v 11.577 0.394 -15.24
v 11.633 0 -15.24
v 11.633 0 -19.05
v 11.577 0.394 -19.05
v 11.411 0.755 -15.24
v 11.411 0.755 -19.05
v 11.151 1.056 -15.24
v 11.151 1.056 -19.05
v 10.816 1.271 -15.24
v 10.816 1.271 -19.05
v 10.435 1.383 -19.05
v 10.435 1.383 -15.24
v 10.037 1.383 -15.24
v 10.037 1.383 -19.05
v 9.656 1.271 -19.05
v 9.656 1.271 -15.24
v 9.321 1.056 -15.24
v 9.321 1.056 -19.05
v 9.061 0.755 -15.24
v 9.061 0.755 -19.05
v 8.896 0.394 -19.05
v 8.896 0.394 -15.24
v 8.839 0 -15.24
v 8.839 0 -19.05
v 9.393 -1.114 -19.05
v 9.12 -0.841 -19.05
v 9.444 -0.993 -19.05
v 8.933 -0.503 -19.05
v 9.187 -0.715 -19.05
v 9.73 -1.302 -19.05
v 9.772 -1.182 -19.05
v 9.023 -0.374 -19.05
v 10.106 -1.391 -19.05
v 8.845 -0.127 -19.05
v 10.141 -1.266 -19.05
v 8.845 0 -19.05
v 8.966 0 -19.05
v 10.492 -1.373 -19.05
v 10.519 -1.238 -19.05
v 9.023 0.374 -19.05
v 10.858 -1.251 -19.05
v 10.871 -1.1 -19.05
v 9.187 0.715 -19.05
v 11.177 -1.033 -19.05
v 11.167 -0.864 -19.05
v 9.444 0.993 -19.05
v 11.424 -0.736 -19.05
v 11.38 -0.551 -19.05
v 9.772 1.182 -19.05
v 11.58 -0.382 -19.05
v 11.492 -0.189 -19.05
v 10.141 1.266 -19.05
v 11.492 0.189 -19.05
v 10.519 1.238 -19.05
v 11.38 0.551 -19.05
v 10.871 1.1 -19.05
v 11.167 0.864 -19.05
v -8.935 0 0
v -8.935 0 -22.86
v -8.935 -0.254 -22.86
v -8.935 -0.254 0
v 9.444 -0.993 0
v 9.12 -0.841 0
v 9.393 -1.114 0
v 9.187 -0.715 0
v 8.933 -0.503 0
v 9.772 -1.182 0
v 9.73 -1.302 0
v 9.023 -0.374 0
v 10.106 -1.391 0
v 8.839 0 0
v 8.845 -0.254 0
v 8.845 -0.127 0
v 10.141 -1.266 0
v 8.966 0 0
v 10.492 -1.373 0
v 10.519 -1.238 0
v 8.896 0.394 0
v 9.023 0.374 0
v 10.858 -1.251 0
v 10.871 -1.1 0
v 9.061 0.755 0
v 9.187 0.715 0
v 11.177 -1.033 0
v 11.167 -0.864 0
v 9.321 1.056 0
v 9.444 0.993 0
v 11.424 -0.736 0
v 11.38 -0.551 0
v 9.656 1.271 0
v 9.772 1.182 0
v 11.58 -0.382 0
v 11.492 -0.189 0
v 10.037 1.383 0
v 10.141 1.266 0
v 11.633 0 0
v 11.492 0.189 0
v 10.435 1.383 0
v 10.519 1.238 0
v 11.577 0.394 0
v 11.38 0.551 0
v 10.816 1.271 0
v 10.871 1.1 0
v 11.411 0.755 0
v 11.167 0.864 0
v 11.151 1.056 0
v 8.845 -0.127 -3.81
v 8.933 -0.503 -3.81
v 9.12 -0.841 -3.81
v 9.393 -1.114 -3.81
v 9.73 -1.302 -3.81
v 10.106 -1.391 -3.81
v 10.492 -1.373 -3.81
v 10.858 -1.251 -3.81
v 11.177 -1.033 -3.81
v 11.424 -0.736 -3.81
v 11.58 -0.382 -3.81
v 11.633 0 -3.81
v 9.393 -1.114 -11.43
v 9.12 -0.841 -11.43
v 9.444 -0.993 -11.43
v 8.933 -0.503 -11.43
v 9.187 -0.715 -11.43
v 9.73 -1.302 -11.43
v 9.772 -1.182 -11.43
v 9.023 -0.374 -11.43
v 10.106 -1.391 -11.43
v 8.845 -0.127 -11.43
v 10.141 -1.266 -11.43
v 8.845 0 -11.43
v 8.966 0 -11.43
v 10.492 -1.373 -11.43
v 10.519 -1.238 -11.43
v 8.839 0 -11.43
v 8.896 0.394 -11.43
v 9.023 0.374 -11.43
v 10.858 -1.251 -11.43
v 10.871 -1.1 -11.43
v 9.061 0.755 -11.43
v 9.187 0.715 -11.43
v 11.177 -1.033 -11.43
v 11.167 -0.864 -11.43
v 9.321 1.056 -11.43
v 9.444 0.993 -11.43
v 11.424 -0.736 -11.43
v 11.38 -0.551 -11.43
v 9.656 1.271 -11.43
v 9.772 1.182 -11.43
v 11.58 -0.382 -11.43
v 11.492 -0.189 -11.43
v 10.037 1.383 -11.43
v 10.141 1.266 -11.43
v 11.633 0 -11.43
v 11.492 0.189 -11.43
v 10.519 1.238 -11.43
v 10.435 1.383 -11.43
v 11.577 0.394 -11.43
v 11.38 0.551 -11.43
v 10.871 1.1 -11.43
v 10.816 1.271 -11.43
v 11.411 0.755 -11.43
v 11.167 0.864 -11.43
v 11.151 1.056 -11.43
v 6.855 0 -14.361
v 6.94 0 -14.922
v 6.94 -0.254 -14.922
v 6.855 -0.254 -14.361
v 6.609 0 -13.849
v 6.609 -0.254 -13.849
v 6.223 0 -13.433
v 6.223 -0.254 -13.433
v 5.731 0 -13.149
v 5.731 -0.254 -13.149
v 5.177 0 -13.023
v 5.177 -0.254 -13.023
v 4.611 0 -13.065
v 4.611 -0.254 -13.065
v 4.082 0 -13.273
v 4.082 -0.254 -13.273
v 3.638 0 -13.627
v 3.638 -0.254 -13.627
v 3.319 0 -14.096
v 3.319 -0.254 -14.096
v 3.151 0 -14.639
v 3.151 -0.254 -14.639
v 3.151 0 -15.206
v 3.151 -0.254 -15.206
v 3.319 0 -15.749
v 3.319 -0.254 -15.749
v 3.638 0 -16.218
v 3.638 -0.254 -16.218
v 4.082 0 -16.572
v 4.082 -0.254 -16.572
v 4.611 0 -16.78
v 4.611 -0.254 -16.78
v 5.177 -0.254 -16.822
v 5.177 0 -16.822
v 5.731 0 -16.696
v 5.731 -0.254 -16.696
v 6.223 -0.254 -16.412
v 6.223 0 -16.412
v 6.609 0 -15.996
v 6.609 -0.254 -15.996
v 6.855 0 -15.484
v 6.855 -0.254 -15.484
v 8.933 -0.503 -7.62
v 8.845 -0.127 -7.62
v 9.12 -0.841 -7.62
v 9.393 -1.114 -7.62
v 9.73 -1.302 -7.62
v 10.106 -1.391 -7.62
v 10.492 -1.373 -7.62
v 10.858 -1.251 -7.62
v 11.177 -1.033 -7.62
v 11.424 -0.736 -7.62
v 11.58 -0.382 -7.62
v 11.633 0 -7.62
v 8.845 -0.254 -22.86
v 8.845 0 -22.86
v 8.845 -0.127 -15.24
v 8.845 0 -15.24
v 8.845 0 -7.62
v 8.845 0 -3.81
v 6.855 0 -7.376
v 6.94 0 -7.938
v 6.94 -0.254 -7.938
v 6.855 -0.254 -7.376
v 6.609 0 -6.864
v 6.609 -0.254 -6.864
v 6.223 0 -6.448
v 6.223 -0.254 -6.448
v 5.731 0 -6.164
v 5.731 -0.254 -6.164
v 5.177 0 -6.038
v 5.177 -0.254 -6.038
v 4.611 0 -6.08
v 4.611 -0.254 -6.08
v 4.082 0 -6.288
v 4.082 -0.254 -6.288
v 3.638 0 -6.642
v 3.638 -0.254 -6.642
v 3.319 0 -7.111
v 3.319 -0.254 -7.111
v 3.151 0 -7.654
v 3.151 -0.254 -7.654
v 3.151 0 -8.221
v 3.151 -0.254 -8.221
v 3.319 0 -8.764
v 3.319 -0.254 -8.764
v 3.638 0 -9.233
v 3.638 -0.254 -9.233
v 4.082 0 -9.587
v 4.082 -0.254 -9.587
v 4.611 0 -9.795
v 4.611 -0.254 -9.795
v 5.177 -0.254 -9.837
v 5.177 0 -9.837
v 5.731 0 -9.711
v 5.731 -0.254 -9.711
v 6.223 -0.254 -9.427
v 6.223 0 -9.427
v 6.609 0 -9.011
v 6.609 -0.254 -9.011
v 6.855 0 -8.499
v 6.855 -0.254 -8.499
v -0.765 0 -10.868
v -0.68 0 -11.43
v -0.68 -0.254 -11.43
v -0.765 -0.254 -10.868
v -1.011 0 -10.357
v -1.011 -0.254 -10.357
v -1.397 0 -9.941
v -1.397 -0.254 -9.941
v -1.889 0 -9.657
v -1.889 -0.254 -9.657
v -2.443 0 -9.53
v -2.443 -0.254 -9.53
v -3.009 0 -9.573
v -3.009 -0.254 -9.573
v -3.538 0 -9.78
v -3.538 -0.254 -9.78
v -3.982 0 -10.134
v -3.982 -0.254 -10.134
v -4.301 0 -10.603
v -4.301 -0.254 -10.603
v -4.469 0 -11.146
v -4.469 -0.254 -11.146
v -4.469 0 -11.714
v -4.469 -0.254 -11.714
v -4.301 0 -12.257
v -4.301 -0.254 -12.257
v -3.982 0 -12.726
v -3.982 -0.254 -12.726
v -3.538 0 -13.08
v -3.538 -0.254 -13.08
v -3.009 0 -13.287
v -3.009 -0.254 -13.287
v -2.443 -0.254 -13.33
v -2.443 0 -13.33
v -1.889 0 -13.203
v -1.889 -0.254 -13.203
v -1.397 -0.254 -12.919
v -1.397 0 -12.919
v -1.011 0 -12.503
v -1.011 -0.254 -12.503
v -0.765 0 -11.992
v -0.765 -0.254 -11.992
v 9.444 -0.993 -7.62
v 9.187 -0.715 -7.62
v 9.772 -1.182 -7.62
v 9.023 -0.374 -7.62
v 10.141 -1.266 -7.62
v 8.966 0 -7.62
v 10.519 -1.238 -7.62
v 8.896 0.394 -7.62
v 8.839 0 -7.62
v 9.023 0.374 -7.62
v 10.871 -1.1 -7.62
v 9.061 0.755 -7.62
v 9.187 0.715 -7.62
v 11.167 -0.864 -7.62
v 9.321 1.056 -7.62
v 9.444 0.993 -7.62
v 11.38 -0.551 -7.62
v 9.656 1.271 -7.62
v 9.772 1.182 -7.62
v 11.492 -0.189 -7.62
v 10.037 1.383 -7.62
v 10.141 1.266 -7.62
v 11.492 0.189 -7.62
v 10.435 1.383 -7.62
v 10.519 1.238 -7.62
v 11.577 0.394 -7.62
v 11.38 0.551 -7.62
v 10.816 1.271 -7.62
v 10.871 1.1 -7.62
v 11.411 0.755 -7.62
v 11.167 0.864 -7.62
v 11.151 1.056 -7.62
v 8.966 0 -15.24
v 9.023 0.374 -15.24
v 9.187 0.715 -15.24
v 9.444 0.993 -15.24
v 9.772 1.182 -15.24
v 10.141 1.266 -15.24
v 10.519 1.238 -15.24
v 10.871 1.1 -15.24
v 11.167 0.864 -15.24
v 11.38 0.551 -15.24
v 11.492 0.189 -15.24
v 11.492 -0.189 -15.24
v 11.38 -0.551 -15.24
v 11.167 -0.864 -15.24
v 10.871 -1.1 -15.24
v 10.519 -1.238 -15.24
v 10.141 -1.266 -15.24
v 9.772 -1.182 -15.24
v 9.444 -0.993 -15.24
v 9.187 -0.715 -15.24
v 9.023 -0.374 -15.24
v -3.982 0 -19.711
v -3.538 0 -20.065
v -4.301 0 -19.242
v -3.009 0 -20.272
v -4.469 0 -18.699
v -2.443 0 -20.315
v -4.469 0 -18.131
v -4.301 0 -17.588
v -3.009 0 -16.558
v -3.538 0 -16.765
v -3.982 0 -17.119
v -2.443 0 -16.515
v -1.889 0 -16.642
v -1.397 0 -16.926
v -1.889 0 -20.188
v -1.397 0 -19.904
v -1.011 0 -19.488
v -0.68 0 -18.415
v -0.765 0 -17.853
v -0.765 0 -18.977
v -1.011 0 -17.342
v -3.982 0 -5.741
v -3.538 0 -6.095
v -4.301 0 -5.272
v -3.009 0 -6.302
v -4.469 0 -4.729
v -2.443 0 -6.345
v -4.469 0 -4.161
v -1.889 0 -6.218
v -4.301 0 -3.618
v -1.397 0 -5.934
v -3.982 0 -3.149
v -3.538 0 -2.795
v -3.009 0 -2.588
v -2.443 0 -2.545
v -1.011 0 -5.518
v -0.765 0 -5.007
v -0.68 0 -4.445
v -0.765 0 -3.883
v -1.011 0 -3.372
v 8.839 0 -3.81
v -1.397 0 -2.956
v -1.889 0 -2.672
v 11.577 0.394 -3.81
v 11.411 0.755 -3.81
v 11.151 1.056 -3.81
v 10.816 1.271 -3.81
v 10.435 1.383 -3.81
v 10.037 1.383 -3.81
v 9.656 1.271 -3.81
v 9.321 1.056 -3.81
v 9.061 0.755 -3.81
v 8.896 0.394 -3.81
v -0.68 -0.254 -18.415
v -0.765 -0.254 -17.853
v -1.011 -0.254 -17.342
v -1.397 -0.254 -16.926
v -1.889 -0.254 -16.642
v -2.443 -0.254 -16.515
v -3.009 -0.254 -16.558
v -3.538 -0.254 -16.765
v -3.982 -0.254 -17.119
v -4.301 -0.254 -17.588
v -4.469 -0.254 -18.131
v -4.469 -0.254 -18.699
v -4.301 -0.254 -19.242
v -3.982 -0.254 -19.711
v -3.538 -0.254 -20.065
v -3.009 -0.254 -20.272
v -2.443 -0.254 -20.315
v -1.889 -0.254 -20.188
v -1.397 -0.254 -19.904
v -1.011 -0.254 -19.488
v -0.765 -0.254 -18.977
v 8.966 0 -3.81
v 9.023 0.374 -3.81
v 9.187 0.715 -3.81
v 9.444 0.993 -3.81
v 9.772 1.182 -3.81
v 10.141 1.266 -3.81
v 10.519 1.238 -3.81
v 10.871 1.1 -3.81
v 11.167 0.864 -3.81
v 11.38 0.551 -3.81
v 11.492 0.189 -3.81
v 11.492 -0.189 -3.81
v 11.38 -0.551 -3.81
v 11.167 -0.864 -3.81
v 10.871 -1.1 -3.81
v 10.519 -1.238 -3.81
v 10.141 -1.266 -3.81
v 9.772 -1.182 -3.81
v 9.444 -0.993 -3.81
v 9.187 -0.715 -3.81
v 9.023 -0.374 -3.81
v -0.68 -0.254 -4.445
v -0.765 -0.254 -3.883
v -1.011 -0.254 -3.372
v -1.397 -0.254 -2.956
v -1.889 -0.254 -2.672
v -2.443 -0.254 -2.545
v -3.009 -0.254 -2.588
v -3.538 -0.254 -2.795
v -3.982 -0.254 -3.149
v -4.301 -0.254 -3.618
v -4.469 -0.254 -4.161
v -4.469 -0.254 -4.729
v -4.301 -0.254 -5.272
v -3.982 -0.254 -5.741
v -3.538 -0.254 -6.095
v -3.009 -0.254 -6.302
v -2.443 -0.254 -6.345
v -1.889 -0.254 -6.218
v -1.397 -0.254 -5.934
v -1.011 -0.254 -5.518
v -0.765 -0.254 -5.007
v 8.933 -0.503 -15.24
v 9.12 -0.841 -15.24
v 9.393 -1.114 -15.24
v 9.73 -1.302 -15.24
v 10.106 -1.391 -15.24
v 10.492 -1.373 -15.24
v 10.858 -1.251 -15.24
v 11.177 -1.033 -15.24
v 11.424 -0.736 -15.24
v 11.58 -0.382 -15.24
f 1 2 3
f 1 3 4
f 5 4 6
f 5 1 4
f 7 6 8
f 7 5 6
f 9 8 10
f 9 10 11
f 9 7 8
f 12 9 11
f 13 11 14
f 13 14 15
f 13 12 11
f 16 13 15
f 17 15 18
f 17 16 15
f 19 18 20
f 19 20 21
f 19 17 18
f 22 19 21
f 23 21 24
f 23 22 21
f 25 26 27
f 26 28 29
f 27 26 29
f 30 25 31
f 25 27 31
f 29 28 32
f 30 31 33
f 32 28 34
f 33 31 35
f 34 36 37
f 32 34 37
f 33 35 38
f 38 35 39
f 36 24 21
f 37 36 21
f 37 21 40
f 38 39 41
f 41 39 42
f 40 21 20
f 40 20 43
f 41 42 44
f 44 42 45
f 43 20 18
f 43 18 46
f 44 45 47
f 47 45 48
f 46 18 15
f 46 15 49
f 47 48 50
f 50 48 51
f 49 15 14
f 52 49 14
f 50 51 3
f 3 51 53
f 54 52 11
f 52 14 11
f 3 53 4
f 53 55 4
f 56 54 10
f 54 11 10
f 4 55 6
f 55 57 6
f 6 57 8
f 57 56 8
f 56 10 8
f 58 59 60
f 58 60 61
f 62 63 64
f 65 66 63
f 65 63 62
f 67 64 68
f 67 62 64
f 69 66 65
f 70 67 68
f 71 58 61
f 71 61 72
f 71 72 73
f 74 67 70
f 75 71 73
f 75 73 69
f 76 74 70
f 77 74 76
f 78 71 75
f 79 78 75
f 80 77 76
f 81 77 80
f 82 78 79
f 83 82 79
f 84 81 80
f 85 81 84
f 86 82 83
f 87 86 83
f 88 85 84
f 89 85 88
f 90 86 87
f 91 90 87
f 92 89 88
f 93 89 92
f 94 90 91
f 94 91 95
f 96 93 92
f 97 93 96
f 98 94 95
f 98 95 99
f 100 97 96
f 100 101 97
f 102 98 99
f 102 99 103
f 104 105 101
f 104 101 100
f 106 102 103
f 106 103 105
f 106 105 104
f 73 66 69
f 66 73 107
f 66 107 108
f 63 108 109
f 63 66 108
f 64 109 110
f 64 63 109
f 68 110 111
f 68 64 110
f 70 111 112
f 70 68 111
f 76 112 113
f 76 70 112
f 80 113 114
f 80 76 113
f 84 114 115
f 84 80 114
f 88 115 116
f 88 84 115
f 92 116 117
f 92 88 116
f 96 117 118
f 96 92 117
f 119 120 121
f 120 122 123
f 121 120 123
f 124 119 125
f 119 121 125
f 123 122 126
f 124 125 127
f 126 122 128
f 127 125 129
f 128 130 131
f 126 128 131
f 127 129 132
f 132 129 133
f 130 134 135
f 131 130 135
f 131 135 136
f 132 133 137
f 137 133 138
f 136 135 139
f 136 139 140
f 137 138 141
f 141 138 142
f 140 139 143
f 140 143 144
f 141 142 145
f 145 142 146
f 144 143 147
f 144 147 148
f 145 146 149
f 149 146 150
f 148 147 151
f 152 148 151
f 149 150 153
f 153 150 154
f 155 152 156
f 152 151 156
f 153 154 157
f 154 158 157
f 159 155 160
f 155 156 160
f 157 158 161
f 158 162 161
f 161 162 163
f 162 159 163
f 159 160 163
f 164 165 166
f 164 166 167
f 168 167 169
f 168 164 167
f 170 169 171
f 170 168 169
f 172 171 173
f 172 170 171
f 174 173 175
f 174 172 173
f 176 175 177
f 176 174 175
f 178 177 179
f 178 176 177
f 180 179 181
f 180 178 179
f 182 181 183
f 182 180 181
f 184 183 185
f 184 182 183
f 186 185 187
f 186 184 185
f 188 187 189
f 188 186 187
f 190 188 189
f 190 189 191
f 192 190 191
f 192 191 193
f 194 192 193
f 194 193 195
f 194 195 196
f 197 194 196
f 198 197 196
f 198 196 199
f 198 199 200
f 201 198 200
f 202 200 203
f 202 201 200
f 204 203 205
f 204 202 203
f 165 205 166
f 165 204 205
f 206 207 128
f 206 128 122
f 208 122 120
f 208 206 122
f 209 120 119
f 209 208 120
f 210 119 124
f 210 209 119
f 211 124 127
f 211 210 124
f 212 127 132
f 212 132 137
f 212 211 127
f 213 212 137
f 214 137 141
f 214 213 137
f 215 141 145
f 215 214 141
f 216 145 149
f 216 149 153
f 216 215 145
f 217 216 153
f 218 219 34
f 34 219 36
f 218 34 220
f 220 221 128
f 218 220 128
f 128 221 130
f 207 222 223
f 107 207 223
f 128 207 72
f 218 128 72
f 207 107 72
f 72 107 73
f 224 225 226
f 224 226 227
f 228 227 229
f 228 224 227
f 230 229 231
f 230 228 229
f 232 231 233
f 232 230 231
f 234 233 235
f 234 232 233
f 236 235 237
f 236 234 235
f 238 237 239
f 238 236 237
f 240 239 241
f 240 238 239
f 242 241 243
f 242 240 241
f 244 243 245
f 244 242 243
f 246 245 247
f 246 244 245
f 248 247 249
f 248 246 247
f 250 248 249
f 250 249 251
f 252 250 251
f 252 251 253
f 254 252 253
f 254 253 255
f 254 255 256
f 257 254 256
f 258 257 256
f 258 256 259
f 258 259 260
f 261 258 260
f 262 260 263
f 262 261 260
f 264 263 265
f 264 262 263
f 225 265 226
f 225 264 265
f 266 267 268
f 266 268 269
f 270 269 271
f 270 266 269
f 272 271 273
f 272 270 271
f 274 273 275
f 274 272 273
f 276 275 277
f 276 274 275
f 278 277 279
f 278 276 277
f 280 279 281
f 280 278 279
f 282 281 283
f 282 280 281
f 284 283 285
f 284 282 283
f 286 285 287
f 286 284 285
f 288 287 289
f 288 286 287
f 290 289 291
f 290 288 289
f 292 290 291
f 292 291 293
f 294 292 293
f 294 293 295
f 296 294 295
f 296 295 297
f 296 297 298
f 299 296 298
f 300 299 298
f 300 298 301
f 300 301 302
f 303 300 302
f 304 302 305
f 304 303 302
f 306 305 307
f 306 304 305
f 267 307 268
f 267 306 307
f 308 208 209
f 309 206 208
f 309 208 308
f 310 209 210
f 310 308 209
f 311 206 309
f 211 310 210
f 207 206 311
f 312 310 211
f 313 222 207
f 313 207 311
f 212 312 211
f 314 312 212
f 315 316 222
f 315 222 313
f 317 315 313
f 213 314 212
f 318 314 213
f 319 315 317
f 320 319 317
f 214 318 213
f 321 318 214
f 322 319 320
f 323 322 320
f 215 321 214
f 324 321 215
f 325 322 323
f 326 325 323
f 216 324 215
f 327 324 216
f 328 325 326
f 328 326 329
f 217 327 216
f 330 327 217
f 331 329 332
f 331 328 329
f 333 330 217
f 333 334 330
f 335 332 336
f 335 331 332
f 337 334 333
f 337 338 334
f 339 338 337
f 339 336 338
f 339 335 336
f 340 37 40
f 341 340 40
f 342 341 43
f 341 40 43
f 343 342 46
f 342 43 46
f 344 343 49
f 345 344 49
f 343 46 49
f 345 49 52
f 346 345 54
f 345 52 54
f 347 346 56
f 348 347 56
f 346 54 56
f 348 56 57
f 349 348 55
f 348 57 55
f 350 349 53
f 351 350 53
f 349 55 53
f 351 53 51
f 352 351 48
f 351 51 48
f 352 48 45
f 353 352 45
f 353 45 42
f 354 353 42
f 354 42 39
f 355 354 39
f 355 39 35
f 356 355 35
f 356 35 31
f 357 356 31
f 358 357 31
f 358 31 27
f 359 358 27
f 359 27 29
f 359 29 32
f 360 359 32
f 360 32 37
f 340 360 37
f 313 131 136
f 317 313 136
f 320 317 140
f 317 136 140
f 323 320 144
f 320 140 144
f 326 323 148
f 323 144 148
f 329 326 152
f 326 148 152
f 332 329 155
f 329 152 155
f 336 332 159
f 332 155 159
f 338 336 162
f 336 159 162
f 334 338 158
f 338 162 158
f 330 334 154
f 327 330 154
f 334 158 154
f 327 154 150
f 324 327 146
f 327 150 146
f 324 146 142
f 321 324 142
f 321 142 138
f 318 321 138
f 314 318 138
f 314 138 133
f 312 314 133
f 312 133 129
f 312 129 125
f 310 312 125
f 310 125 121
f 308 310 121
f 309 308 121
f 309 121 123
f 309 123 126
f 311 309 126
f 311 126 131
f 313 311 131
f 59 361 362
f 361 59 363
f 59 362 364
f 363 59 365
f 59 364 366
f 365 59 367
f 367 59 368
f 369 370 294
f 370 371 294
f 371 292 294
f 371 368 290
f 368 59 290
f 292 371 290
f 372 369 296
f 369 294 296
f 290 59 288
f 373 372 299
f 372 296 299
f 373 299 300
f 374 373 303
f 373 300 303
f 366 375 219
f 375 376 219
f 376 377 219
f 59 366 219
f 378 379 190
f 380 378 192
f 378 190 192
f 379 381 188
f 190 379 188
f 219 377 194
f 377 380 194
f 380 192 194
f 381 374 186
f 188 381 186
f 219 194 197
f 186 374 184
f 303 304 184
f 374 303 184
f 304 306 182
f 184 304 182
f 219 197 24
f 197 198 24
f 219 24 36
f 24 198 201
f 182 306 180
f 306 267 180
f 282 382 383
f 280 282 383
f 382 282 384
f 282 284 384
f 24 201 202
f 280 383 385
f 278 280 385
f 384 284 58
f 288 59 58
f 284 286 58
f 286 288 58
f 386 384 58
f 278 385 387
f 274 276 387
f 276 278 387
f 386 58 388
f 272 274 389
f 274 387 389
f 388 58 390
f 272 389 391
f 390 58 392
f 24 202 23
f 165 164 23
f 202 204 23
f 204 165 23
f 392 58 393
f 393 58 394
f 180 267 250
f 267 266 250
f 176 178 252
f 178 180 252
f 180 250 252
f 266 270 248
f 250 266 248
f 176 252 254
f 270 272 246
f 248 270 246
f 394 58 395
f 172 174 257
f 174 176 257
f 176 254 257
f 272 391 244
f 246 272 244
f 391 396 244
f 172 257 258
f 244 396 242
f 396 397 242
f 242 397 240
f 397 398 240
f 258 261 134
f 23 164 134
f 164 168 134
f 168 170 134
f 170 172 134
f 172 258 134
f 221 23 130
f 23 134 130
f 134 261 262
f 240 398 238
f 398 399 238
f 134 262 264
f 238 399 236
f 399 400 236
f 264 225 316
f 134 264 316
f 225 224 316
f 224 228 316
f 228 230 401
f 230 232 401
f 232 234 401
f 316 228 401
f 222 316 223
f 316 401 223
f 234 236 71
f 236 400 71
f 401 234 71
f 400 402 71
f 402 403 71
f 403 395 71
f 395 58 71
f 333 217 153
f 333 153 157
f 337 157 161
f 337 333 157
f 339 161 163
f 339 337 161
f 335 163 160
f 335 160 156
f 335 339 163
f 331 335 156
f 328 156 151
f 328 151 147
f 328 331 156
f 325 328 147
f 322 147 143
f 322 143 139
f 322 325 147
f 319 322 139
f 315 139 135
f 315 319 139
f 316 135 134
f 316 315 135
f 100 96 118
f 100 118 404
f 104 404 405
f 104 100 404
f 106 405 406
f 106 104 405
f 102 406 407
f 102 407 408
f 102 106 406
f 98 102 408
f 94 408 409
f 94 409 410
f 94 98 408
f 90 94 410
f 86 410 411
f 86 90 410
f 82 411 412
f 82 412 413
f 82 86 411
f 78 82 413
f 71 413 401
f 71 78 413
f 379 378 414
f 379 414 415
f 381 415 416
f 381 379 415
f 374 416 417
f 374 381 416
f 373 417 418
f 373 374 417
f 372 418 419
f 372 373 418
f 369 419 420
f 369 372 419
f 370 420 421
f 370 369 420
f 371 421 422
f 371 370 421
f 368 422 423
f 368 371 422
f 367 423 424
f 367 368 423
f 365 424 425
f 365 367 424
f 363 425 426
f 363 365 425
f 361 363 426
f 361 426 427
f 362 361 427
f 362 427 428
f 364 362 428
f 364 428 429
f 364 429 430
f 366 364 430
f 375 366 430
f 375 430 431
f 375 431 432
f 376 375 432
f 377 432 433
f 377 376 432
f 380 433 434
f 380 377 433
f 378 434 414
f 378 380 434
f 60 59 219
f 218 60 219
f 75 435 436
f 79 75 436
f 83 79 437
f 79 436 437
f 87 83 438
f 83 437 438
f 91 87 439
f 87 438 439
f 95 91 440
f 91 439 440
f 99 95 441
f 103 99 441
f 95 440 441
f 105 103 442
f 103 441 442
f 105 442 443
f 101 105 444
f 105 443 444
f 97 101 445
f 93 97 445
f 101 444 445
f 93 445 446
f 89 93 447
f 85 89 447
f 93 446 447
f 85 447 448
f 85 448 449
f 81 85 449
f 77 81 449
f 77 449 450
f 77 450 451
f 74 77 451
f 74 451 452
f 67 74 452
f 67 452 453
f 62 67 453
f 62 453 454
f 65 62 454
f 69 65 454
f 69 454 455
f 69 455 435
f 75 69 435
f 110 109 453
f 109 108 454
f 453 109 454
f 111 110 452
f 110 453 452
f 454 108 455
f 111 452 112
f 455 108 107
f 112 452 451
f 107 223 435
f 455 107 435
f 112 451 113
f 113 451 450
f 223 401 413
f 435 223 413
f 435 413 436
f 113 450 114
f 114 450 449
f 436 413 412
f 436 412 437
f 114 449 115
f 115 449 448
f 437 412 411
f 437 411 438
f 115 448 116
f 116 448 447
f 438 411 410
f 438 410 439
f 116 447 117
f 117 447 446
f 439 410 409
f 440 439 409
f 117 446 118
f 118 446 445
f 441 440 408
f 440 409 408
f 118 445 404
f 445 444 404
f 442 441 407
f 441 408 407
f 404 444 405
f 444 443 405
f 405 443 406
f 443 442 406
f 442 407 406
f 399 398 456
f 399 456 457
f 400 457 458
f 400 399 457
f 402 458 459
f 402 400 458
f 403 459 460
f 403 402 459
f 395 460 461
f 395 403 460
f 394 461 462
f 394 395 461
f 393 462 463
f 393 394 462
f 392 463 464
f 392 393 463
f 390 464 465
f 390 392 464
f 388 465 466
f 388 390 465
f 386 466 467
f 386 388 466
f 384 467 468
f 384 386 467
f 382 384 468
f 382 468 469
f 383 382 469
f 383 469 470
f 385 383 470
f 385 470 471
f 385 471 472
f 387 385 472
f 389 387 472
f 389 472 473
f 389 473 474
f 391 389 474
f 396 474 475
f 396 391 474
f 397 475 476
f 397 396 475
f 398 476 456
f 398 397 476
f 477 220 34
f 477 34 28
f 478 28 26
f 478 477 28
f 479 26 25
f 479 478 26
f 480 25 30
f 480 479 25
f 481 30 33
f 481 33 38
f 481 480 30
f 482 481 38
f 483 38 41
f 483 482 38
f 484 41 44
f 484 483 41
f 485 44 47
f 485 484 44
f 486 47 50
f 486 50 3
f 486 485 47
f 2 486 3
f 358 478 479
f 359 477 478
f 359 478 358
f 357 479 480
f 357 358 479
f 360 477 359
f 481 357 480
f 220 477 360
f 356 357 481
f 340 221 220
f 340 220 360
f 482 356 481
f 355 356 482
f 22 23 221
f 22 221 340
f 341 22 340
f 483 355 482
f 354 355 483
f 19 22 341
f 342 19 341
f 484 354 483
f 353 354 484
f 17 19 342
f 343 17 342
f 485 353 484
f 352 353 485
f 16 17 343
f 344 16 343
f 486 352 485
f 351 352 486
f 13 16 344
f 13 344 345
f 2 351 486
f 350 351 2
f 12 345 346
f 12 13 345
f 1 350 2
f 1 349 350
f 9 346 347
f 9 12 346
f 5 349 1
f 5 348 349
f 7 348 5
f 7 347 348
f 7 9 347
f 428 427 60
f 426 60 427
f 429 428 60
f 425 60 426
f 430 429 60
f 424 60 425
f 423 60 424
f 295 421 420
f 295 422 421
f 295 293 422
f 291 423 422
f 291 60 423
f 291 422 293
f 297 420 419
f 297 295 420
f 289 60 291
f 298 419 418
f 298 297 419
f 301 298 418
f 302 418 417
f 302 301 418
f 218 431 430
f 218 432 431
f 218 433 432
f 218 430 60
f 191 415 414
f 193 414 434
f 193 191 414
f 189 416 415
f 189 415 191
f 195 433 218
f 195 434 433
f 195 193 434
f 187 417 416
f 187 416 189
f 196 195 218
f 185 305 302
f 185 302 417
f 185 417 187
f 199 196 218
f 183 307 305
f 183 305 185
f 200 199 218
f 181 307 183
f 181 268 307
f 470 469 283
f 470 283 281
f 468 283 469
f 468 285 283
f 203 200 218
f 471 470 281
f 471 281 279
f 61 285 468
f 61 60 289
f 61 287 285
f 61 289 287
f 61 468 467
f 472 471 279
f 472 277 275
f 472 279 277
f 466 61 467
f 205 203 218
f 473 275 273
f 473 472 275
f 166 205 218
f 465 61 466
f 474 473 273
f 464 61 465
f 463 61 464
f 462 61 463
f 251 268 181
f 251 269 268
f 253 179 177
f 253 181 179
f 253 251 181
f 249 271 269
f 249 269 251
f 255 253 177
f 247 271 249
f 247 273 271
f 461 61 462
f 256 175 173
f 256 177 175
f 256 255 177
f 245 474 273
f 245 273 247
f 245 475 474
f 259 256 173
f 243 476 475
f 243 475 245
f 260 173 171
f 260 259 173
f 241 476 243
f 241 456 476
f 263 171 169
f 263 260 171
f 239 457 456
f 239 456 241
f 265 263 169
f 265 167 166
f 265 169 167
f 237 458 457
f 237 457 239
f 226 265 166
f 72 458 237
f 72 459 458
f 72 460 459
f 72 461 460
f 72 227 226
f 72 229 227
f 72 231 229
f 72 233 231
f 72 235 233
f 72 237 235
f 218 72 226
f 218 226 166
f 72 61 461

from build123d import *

# Parameters (mm, degrees)
F0_W     = 17.78
F0_H     = 22.86
F0_R     = 1.905
F1_DEPTH = 0.254
F2_R     = 1.397
F3_DEPTH = 3.81
F5_R     = 1.397
F6_DEPTH = 3.81
F8_R     = 1.397
F9_DEPTH = 3.81
F10_D    = 2.54


with BuildPart() as f1:
    # F0 (on Front) → F1 (new body)
    with BuildSketch(Plane.XZ):
        with Locations((-0.045063, -11.43)):
            Rectangle(F0_W, F0_H)
        with Locations((-2.585063, -18.415)):
            Circle(F0_R, mode=Mode.SUBTRACT)
        with Locations((5.034937, -14.9225)):
            Circle(F0_R, mode=Mode.SUBTRACT)
        with Locations((-2.585063, -11.43)):
            Circle(F0_R, mode=Mode.SUBTRACT)
        with Locations((-2.585063, -4.445)):
            Circle(F0_R, mode=Mode.SUBTRACT)
        with Locations((5.034937, -7.9375)):
            Circle(F0_R, mode=Mode.SUBTRACT)
    extrude(amount=F1_DEPTH)

    # F2 (on Top) → F3 (join)
    with BuildSketch(Plane.XY):
        with Locations((10.236152, 0)):
            Circle(F2_R)
    extrude(amount=-F3_DEPTH)

    # F5 (on offset) → F6 (join)
    with BuildSketch(Plane.XY.offset(-7.62)):
        with Locations((10.236152, 0)):
            Circle(F5_R)
    extrude(amount=-F6_DEPTH)

    # F8 (on offset) → F9 (join)
    with BuildSketch(Plane.XY.offset(-15.24)):
        with Locations((10.236152, 0)):
            Circle(F8_R)
    extrude(amount=-F9_DEPTH)

    # F10 (through all)
    with Locations(Plane.XY):
        with Locations((10.236152, 0)):
            Hole(F10_D / 2)


solid = f1.part
